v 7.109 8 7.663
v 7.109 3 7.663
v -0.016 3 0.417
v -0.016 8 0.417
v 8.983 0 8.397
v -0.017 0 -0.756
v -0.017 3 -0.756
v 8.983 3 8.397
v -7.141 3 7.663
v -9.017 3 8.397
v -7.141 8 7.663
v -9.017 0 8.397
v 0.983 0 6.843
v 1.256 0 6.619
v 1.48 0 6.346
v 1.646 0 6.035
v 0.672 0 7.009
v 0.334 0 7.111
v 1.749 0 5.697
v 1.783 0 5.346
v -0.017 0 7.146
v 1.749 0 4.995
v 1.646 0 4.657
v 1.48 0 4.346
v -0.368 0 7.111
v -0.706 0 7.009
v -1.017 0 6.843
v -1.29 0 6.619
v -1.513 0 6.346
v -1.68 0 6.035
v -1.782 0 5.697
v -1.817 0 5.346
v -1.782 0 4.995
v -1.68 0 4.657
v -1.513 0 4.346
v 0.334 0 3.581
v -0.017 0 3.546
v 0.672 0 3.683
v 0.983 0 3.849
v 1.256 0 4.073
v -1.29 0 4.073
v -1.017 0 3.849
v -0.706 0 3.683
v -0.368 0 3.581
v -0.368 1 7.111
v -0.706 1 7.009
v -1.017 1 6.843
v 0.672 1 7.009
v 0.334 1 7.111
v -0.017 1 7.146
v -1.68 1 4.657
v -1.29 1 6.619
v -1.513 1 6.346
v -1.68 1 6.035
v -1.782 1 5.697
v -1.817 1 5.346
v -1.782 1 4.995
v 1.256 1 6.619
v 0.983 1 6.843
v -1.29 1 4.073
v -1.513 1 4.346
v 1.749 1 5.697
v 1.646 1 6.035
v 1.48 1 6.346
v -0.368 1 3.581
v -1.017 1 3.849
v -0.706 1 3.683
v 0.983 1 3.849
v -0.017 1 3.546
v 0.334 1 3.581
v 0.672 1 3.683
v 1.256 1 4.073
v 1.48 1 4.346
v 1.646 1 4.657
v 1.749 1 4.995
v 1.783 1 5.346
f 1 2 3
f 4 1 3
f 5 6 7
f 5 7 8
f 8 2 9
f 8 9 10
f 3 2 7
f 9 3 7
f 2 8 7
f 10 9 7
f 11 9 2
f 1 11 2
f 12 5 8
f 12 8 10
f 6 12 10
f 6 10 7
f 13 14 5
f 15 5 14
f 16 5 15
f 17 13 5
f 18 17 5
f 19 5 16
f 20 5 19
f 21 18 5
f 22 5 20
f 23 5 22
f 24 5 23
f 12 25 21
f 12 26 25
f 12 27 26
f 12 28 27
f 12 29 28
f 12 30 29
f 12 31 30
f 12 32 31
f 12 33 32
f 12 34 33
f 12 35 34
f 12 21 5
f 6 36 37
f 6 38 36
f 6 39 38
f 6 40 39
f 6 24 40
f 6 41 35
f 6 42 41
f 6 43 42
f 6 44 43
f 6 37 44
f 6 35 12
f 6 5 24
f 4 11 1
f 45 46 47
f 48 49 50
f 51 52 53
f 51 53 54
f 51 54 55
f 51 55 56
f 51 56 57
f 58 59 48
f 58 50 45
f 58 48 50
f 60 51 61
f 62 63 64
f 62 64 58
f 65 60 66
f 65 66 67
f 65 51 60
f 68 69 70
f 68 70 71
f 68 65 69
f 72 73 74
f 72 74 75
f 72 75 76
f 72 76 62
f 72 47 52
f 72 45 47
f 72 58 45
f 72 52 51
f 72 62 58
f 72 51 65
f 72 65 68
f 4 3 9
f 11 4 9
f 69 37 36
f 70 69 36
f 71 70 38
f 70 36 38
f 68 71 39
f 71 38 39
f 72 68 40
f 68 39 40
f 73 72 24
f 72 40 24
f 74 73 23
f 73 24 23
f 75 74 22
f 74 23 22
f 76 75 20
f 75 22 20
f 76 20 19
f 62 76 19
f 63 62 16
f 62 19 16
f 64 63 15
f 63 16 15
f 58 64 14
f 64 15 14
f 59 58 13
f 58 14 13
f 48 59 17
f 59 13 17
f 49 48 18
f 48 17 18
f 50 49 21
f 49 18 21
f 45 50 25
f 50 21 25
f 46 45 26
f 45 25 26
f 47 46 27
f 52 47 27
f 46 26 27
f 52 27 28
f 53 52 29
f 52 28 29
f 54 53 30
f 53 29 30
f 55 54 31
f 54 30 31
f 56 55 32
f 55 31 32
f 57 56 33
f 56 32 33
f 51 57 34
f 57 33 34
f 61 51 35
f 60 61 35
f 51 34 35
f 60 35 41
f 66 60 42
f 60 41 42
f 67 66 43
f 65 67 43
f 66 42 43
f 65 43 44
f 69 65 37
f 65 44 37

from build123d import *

# Parameters (mm, degrees)
BOSS_EXTRUDE1_DEPTH = 3
BOSS_EXTRUDE2_DEPTH = 5
SKETCH3_R           = 1.8
CUT_EXTRUDE1_DEPTH  = 1


with BuildPart() as part:
    # Sketch1 → Boss-Extrude1 (new body)
    with BuildSketch(Plane(origin=(0, 0, 0), x_dir=(1, 0, 0), z_dir=(0, 1, 0))):
        Polygon((8.983252998, -8.397111121), (-9.016747002, -8.397111121), (-0.016747002, 0.756293591), align=None)
    extrude(amount=BOSS_EXTRUDE1_DEPTH)

    # Sketch2 → Boss-Extrude2 (add)
    with BuildSketch(Plane(origin=(0, 3, 0), x_dir=(1, 0, 0), z_dir=(0, 1, 0))):
        Polygon((7.109021951, -7.663380877), (-0.015978049, -0.416935476), (-7.141084887, -7.663380877), align=None)
    extrude(amount=BOSS_EXTRUDE2_DEPTH)

    # Sketch3 → Cut-Extrude1 (cut)
    with BuildSketch(Plane.XZ):
        with Locations(Location((-0.016747002, 5.345976217, 0), (0, 0, 270))):
            Circle(SKETCH3_R)
    extrude(amount=-CUT_EXTRUDE1_DEPTH, mode=Mode.SUBTRACT)


solid = part.part
